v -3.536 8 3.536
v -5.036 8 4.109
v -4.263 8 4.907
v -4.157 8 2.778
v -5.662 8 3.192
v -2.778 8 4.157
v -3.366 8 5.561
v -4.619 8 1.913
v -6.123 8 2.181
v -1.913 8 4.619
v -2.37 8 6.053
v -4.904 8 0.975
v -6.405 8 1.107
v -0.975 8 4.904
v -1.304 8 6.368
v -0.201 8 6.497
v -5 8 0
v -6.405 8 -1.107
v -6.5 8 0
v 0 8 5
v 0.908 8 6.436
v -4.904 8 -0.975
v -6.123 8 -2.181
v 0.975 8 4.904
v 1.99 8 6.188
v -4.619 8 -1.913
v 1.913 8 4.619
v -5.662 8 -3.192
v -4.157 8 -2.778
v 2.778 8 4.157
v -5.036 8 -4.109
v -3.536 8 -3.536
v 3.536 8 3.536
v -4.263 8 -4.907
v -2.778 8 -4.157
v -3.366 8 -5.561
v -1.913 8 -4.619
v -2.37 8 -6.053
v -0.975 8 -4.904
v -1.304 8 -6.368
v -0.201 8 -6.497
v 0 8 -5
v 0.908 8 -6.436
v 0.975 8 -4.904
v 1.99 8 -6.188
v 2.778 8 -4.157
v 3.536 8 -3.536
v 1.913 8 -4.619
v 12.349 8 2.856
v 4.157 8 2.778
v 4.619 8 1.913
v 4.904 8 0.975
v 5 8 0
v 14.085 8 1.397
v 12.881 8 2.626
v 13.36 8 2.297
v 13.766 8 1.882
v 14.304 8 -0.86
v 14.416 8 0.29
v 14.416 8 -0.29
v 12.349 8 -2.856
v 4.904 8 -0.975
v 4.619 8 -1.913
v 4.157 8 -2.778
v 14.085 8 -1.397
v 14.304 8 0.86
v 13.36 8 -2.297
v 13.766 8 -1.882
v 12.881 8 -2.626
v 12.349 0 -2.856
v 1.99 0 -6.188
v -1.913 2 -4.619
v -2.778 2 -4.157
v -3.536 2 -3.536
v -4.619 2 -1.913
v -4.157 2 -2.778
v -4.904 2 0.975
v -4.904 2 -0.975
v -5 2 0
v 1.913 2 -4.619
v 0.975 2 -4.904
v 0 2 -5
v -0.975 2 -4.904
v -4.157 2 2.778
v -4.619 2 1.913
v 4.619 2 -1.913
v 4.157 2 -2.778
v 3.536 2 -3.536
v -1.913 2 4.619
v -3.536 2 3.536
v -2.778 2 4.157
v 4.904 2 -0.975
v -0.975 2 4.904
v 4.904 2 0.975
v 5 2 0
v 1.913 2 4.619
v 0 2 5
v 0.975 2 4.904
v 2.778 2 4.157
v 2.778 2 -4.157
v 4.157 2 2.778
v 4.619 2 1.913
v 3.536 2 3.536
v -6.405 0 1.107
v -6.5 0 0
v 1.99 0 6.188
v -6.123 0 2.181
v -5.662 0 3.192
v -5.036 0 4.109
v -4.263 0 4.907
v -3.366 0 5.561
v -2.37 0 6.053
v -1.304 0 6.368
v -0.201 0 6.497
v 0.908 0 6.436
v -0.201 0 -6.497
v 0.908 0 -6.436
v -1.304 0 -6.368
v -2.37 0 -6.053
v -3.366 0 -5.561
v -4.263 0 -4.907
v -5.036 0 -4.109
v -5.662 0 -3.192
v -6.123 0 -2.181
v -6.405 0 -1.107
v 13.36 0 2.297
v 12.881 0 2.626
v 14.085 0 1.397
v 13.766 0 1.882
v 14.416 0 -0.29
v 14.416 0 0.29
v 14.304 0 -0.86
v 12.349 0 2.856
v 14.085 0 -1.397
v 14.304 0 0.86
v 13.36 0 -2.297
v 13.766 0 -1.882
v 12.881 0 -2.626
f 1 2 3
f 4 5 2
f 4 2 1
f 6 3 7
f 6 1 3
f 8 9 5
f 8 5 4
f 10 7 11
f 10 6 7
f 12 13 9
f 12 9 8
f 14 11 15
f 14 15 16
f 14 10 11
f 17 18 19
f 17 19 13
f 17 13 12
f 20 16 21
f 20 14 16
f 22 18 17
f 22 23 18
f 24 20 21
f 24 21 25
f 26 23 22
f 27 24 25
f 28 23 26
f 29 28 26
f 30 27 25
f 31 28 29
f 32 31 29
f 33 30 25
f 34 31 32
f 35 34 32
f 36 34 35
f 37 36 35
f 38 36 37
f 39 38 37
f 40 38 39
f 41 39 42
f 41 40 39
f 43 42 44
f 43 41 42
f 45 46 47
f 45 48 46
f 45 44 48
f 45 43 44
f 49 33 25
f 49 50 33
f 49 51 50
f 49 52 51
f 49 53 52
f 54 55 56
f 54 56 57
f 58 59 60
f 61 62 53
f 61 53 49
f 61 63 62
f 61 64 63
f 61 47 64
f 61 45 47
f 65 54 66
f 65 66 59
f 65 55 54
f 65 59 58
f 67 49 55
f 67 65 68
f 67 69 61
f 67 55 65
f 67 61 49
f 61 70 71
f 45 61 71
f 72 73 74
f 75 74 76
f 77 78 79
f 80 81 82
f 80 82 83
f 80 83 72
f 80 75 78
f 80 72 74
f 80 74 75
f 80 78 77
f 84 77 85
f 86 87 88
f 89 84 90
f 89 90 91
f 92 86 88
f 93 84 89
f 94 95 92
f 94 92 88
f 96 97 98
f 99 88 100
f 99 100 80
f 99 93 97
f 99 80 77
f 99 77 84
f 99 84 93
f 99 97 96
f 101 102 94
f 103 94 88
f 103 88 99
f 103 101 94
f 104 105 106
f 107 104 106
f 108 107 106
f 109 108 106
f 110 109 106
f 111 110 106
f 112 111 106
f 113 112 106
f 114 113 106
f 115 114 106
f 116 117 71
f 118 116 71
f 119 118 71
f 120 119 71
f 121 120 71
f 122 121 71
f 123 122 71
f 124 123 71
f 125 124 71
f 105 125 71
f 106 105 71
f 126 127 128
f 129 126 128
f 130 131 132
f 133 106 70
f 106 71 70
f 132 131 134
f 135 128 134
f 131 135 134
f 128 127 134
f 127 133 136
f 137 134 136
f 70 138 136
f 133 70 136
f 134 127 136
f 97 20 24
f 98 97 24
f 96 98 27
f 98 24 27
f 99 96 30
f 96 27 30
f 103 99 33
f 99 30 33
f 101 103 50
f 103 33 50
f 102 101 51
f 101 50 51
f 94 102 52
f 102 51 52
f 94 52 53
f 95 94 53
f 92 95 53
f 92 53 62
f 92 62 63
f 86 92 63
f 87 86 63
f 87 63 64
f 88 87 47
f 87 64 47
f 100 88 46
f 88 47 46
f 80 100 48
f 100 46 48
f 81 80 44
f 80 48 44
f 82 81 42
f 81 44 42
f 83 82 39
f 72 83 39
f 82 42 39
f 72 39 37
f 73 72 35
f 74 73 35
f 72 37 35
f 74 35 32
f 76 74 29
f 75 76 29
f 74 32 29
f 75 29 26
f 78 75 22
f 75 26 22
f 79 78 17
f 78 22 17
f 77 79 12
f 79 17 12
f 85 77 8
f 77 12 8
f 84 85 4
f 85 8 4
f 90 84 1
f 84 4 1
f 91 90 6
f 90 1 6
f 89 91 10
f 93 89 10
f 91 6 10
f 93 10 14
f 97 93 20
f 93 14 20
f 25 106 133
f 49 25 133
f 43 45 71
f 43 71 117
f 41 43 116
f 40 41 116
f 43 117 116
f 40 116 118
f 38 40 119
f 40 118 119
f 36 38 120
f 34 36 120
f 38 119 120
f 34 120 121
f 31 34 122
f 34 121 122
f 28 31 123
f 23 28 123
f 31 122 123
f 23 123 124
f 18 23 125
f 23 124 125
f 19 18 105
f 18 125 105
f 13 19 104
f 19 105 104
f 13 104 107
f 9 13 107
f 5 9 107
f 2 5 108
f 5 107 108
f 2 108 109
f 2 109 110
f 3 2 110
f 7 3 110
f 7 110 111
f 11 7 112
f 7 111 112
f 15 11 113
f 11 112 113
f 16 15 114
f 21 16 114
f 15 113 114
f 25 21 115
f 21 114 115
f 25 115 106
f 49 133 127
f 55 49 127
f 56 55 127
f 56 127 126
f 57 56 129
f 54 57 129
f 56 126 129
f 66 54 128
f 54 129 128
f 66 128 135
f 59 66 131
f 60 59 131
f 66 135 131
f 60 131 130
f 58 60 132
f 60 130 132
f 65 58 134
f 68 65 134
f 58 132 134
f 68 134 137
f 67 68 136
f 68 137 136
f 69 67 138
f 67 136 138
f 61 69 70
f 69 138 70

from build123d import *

# Parameters (mm, degrees)
SKETCH1_R           = 6.5
BOSS_EXTRUDE1_DEPTH = 8.000000002
SKETCH2_R           = 5
CUT_EXTRUDE1_DEPTH  = 5.999999938


with BuildPart() as part:
    # Sketch1 → Boss-Extrude1 (new body)
    with BuildSketch(Plane(origin=(0, 0, 0), x_dir=(1, 0, 0), z_dir=(0, 1, 0))):
        Circle(SKETCH1_R)
        with BuildLine():
            ThreePointArc((6.5, 0), (5.252972745, -3.828351779), (1.990376203, -6.187762323))
            Line((1.990376203, -6.187762323), (12.348635171, -2.855890303))
            ThreePointArc((12.348635171, -2.855890303), (14.43, 0), (12.348635171, 2.855890303))
            Line((12.348635171, 2.855890303), (1.990376203, 6.187762323))
            ThreePointArc((1.990376203, 6.187762323), (5.252972745, 3.828351779), (6.5, 0))
        make_face()
    extrude(amount=BOSS_EXTRUDE1_DEPTH)

    # Sketch2 → Cut-Extrude1 (cut)
    with BuildSketch(Plane(origin=(0, 8.000000002, 0), x_dir=(1, 0, 0), z_dir=(0, 1, 0))):
        with Locations(Location((0, 0, 0), (0, 0, 270))):
            Circle(SKETCH2_R)
    extrude(amount=-CUT_EXTRUDE1_DEPTH, mode=Mode.SUBTRACT)


solid = part.part
